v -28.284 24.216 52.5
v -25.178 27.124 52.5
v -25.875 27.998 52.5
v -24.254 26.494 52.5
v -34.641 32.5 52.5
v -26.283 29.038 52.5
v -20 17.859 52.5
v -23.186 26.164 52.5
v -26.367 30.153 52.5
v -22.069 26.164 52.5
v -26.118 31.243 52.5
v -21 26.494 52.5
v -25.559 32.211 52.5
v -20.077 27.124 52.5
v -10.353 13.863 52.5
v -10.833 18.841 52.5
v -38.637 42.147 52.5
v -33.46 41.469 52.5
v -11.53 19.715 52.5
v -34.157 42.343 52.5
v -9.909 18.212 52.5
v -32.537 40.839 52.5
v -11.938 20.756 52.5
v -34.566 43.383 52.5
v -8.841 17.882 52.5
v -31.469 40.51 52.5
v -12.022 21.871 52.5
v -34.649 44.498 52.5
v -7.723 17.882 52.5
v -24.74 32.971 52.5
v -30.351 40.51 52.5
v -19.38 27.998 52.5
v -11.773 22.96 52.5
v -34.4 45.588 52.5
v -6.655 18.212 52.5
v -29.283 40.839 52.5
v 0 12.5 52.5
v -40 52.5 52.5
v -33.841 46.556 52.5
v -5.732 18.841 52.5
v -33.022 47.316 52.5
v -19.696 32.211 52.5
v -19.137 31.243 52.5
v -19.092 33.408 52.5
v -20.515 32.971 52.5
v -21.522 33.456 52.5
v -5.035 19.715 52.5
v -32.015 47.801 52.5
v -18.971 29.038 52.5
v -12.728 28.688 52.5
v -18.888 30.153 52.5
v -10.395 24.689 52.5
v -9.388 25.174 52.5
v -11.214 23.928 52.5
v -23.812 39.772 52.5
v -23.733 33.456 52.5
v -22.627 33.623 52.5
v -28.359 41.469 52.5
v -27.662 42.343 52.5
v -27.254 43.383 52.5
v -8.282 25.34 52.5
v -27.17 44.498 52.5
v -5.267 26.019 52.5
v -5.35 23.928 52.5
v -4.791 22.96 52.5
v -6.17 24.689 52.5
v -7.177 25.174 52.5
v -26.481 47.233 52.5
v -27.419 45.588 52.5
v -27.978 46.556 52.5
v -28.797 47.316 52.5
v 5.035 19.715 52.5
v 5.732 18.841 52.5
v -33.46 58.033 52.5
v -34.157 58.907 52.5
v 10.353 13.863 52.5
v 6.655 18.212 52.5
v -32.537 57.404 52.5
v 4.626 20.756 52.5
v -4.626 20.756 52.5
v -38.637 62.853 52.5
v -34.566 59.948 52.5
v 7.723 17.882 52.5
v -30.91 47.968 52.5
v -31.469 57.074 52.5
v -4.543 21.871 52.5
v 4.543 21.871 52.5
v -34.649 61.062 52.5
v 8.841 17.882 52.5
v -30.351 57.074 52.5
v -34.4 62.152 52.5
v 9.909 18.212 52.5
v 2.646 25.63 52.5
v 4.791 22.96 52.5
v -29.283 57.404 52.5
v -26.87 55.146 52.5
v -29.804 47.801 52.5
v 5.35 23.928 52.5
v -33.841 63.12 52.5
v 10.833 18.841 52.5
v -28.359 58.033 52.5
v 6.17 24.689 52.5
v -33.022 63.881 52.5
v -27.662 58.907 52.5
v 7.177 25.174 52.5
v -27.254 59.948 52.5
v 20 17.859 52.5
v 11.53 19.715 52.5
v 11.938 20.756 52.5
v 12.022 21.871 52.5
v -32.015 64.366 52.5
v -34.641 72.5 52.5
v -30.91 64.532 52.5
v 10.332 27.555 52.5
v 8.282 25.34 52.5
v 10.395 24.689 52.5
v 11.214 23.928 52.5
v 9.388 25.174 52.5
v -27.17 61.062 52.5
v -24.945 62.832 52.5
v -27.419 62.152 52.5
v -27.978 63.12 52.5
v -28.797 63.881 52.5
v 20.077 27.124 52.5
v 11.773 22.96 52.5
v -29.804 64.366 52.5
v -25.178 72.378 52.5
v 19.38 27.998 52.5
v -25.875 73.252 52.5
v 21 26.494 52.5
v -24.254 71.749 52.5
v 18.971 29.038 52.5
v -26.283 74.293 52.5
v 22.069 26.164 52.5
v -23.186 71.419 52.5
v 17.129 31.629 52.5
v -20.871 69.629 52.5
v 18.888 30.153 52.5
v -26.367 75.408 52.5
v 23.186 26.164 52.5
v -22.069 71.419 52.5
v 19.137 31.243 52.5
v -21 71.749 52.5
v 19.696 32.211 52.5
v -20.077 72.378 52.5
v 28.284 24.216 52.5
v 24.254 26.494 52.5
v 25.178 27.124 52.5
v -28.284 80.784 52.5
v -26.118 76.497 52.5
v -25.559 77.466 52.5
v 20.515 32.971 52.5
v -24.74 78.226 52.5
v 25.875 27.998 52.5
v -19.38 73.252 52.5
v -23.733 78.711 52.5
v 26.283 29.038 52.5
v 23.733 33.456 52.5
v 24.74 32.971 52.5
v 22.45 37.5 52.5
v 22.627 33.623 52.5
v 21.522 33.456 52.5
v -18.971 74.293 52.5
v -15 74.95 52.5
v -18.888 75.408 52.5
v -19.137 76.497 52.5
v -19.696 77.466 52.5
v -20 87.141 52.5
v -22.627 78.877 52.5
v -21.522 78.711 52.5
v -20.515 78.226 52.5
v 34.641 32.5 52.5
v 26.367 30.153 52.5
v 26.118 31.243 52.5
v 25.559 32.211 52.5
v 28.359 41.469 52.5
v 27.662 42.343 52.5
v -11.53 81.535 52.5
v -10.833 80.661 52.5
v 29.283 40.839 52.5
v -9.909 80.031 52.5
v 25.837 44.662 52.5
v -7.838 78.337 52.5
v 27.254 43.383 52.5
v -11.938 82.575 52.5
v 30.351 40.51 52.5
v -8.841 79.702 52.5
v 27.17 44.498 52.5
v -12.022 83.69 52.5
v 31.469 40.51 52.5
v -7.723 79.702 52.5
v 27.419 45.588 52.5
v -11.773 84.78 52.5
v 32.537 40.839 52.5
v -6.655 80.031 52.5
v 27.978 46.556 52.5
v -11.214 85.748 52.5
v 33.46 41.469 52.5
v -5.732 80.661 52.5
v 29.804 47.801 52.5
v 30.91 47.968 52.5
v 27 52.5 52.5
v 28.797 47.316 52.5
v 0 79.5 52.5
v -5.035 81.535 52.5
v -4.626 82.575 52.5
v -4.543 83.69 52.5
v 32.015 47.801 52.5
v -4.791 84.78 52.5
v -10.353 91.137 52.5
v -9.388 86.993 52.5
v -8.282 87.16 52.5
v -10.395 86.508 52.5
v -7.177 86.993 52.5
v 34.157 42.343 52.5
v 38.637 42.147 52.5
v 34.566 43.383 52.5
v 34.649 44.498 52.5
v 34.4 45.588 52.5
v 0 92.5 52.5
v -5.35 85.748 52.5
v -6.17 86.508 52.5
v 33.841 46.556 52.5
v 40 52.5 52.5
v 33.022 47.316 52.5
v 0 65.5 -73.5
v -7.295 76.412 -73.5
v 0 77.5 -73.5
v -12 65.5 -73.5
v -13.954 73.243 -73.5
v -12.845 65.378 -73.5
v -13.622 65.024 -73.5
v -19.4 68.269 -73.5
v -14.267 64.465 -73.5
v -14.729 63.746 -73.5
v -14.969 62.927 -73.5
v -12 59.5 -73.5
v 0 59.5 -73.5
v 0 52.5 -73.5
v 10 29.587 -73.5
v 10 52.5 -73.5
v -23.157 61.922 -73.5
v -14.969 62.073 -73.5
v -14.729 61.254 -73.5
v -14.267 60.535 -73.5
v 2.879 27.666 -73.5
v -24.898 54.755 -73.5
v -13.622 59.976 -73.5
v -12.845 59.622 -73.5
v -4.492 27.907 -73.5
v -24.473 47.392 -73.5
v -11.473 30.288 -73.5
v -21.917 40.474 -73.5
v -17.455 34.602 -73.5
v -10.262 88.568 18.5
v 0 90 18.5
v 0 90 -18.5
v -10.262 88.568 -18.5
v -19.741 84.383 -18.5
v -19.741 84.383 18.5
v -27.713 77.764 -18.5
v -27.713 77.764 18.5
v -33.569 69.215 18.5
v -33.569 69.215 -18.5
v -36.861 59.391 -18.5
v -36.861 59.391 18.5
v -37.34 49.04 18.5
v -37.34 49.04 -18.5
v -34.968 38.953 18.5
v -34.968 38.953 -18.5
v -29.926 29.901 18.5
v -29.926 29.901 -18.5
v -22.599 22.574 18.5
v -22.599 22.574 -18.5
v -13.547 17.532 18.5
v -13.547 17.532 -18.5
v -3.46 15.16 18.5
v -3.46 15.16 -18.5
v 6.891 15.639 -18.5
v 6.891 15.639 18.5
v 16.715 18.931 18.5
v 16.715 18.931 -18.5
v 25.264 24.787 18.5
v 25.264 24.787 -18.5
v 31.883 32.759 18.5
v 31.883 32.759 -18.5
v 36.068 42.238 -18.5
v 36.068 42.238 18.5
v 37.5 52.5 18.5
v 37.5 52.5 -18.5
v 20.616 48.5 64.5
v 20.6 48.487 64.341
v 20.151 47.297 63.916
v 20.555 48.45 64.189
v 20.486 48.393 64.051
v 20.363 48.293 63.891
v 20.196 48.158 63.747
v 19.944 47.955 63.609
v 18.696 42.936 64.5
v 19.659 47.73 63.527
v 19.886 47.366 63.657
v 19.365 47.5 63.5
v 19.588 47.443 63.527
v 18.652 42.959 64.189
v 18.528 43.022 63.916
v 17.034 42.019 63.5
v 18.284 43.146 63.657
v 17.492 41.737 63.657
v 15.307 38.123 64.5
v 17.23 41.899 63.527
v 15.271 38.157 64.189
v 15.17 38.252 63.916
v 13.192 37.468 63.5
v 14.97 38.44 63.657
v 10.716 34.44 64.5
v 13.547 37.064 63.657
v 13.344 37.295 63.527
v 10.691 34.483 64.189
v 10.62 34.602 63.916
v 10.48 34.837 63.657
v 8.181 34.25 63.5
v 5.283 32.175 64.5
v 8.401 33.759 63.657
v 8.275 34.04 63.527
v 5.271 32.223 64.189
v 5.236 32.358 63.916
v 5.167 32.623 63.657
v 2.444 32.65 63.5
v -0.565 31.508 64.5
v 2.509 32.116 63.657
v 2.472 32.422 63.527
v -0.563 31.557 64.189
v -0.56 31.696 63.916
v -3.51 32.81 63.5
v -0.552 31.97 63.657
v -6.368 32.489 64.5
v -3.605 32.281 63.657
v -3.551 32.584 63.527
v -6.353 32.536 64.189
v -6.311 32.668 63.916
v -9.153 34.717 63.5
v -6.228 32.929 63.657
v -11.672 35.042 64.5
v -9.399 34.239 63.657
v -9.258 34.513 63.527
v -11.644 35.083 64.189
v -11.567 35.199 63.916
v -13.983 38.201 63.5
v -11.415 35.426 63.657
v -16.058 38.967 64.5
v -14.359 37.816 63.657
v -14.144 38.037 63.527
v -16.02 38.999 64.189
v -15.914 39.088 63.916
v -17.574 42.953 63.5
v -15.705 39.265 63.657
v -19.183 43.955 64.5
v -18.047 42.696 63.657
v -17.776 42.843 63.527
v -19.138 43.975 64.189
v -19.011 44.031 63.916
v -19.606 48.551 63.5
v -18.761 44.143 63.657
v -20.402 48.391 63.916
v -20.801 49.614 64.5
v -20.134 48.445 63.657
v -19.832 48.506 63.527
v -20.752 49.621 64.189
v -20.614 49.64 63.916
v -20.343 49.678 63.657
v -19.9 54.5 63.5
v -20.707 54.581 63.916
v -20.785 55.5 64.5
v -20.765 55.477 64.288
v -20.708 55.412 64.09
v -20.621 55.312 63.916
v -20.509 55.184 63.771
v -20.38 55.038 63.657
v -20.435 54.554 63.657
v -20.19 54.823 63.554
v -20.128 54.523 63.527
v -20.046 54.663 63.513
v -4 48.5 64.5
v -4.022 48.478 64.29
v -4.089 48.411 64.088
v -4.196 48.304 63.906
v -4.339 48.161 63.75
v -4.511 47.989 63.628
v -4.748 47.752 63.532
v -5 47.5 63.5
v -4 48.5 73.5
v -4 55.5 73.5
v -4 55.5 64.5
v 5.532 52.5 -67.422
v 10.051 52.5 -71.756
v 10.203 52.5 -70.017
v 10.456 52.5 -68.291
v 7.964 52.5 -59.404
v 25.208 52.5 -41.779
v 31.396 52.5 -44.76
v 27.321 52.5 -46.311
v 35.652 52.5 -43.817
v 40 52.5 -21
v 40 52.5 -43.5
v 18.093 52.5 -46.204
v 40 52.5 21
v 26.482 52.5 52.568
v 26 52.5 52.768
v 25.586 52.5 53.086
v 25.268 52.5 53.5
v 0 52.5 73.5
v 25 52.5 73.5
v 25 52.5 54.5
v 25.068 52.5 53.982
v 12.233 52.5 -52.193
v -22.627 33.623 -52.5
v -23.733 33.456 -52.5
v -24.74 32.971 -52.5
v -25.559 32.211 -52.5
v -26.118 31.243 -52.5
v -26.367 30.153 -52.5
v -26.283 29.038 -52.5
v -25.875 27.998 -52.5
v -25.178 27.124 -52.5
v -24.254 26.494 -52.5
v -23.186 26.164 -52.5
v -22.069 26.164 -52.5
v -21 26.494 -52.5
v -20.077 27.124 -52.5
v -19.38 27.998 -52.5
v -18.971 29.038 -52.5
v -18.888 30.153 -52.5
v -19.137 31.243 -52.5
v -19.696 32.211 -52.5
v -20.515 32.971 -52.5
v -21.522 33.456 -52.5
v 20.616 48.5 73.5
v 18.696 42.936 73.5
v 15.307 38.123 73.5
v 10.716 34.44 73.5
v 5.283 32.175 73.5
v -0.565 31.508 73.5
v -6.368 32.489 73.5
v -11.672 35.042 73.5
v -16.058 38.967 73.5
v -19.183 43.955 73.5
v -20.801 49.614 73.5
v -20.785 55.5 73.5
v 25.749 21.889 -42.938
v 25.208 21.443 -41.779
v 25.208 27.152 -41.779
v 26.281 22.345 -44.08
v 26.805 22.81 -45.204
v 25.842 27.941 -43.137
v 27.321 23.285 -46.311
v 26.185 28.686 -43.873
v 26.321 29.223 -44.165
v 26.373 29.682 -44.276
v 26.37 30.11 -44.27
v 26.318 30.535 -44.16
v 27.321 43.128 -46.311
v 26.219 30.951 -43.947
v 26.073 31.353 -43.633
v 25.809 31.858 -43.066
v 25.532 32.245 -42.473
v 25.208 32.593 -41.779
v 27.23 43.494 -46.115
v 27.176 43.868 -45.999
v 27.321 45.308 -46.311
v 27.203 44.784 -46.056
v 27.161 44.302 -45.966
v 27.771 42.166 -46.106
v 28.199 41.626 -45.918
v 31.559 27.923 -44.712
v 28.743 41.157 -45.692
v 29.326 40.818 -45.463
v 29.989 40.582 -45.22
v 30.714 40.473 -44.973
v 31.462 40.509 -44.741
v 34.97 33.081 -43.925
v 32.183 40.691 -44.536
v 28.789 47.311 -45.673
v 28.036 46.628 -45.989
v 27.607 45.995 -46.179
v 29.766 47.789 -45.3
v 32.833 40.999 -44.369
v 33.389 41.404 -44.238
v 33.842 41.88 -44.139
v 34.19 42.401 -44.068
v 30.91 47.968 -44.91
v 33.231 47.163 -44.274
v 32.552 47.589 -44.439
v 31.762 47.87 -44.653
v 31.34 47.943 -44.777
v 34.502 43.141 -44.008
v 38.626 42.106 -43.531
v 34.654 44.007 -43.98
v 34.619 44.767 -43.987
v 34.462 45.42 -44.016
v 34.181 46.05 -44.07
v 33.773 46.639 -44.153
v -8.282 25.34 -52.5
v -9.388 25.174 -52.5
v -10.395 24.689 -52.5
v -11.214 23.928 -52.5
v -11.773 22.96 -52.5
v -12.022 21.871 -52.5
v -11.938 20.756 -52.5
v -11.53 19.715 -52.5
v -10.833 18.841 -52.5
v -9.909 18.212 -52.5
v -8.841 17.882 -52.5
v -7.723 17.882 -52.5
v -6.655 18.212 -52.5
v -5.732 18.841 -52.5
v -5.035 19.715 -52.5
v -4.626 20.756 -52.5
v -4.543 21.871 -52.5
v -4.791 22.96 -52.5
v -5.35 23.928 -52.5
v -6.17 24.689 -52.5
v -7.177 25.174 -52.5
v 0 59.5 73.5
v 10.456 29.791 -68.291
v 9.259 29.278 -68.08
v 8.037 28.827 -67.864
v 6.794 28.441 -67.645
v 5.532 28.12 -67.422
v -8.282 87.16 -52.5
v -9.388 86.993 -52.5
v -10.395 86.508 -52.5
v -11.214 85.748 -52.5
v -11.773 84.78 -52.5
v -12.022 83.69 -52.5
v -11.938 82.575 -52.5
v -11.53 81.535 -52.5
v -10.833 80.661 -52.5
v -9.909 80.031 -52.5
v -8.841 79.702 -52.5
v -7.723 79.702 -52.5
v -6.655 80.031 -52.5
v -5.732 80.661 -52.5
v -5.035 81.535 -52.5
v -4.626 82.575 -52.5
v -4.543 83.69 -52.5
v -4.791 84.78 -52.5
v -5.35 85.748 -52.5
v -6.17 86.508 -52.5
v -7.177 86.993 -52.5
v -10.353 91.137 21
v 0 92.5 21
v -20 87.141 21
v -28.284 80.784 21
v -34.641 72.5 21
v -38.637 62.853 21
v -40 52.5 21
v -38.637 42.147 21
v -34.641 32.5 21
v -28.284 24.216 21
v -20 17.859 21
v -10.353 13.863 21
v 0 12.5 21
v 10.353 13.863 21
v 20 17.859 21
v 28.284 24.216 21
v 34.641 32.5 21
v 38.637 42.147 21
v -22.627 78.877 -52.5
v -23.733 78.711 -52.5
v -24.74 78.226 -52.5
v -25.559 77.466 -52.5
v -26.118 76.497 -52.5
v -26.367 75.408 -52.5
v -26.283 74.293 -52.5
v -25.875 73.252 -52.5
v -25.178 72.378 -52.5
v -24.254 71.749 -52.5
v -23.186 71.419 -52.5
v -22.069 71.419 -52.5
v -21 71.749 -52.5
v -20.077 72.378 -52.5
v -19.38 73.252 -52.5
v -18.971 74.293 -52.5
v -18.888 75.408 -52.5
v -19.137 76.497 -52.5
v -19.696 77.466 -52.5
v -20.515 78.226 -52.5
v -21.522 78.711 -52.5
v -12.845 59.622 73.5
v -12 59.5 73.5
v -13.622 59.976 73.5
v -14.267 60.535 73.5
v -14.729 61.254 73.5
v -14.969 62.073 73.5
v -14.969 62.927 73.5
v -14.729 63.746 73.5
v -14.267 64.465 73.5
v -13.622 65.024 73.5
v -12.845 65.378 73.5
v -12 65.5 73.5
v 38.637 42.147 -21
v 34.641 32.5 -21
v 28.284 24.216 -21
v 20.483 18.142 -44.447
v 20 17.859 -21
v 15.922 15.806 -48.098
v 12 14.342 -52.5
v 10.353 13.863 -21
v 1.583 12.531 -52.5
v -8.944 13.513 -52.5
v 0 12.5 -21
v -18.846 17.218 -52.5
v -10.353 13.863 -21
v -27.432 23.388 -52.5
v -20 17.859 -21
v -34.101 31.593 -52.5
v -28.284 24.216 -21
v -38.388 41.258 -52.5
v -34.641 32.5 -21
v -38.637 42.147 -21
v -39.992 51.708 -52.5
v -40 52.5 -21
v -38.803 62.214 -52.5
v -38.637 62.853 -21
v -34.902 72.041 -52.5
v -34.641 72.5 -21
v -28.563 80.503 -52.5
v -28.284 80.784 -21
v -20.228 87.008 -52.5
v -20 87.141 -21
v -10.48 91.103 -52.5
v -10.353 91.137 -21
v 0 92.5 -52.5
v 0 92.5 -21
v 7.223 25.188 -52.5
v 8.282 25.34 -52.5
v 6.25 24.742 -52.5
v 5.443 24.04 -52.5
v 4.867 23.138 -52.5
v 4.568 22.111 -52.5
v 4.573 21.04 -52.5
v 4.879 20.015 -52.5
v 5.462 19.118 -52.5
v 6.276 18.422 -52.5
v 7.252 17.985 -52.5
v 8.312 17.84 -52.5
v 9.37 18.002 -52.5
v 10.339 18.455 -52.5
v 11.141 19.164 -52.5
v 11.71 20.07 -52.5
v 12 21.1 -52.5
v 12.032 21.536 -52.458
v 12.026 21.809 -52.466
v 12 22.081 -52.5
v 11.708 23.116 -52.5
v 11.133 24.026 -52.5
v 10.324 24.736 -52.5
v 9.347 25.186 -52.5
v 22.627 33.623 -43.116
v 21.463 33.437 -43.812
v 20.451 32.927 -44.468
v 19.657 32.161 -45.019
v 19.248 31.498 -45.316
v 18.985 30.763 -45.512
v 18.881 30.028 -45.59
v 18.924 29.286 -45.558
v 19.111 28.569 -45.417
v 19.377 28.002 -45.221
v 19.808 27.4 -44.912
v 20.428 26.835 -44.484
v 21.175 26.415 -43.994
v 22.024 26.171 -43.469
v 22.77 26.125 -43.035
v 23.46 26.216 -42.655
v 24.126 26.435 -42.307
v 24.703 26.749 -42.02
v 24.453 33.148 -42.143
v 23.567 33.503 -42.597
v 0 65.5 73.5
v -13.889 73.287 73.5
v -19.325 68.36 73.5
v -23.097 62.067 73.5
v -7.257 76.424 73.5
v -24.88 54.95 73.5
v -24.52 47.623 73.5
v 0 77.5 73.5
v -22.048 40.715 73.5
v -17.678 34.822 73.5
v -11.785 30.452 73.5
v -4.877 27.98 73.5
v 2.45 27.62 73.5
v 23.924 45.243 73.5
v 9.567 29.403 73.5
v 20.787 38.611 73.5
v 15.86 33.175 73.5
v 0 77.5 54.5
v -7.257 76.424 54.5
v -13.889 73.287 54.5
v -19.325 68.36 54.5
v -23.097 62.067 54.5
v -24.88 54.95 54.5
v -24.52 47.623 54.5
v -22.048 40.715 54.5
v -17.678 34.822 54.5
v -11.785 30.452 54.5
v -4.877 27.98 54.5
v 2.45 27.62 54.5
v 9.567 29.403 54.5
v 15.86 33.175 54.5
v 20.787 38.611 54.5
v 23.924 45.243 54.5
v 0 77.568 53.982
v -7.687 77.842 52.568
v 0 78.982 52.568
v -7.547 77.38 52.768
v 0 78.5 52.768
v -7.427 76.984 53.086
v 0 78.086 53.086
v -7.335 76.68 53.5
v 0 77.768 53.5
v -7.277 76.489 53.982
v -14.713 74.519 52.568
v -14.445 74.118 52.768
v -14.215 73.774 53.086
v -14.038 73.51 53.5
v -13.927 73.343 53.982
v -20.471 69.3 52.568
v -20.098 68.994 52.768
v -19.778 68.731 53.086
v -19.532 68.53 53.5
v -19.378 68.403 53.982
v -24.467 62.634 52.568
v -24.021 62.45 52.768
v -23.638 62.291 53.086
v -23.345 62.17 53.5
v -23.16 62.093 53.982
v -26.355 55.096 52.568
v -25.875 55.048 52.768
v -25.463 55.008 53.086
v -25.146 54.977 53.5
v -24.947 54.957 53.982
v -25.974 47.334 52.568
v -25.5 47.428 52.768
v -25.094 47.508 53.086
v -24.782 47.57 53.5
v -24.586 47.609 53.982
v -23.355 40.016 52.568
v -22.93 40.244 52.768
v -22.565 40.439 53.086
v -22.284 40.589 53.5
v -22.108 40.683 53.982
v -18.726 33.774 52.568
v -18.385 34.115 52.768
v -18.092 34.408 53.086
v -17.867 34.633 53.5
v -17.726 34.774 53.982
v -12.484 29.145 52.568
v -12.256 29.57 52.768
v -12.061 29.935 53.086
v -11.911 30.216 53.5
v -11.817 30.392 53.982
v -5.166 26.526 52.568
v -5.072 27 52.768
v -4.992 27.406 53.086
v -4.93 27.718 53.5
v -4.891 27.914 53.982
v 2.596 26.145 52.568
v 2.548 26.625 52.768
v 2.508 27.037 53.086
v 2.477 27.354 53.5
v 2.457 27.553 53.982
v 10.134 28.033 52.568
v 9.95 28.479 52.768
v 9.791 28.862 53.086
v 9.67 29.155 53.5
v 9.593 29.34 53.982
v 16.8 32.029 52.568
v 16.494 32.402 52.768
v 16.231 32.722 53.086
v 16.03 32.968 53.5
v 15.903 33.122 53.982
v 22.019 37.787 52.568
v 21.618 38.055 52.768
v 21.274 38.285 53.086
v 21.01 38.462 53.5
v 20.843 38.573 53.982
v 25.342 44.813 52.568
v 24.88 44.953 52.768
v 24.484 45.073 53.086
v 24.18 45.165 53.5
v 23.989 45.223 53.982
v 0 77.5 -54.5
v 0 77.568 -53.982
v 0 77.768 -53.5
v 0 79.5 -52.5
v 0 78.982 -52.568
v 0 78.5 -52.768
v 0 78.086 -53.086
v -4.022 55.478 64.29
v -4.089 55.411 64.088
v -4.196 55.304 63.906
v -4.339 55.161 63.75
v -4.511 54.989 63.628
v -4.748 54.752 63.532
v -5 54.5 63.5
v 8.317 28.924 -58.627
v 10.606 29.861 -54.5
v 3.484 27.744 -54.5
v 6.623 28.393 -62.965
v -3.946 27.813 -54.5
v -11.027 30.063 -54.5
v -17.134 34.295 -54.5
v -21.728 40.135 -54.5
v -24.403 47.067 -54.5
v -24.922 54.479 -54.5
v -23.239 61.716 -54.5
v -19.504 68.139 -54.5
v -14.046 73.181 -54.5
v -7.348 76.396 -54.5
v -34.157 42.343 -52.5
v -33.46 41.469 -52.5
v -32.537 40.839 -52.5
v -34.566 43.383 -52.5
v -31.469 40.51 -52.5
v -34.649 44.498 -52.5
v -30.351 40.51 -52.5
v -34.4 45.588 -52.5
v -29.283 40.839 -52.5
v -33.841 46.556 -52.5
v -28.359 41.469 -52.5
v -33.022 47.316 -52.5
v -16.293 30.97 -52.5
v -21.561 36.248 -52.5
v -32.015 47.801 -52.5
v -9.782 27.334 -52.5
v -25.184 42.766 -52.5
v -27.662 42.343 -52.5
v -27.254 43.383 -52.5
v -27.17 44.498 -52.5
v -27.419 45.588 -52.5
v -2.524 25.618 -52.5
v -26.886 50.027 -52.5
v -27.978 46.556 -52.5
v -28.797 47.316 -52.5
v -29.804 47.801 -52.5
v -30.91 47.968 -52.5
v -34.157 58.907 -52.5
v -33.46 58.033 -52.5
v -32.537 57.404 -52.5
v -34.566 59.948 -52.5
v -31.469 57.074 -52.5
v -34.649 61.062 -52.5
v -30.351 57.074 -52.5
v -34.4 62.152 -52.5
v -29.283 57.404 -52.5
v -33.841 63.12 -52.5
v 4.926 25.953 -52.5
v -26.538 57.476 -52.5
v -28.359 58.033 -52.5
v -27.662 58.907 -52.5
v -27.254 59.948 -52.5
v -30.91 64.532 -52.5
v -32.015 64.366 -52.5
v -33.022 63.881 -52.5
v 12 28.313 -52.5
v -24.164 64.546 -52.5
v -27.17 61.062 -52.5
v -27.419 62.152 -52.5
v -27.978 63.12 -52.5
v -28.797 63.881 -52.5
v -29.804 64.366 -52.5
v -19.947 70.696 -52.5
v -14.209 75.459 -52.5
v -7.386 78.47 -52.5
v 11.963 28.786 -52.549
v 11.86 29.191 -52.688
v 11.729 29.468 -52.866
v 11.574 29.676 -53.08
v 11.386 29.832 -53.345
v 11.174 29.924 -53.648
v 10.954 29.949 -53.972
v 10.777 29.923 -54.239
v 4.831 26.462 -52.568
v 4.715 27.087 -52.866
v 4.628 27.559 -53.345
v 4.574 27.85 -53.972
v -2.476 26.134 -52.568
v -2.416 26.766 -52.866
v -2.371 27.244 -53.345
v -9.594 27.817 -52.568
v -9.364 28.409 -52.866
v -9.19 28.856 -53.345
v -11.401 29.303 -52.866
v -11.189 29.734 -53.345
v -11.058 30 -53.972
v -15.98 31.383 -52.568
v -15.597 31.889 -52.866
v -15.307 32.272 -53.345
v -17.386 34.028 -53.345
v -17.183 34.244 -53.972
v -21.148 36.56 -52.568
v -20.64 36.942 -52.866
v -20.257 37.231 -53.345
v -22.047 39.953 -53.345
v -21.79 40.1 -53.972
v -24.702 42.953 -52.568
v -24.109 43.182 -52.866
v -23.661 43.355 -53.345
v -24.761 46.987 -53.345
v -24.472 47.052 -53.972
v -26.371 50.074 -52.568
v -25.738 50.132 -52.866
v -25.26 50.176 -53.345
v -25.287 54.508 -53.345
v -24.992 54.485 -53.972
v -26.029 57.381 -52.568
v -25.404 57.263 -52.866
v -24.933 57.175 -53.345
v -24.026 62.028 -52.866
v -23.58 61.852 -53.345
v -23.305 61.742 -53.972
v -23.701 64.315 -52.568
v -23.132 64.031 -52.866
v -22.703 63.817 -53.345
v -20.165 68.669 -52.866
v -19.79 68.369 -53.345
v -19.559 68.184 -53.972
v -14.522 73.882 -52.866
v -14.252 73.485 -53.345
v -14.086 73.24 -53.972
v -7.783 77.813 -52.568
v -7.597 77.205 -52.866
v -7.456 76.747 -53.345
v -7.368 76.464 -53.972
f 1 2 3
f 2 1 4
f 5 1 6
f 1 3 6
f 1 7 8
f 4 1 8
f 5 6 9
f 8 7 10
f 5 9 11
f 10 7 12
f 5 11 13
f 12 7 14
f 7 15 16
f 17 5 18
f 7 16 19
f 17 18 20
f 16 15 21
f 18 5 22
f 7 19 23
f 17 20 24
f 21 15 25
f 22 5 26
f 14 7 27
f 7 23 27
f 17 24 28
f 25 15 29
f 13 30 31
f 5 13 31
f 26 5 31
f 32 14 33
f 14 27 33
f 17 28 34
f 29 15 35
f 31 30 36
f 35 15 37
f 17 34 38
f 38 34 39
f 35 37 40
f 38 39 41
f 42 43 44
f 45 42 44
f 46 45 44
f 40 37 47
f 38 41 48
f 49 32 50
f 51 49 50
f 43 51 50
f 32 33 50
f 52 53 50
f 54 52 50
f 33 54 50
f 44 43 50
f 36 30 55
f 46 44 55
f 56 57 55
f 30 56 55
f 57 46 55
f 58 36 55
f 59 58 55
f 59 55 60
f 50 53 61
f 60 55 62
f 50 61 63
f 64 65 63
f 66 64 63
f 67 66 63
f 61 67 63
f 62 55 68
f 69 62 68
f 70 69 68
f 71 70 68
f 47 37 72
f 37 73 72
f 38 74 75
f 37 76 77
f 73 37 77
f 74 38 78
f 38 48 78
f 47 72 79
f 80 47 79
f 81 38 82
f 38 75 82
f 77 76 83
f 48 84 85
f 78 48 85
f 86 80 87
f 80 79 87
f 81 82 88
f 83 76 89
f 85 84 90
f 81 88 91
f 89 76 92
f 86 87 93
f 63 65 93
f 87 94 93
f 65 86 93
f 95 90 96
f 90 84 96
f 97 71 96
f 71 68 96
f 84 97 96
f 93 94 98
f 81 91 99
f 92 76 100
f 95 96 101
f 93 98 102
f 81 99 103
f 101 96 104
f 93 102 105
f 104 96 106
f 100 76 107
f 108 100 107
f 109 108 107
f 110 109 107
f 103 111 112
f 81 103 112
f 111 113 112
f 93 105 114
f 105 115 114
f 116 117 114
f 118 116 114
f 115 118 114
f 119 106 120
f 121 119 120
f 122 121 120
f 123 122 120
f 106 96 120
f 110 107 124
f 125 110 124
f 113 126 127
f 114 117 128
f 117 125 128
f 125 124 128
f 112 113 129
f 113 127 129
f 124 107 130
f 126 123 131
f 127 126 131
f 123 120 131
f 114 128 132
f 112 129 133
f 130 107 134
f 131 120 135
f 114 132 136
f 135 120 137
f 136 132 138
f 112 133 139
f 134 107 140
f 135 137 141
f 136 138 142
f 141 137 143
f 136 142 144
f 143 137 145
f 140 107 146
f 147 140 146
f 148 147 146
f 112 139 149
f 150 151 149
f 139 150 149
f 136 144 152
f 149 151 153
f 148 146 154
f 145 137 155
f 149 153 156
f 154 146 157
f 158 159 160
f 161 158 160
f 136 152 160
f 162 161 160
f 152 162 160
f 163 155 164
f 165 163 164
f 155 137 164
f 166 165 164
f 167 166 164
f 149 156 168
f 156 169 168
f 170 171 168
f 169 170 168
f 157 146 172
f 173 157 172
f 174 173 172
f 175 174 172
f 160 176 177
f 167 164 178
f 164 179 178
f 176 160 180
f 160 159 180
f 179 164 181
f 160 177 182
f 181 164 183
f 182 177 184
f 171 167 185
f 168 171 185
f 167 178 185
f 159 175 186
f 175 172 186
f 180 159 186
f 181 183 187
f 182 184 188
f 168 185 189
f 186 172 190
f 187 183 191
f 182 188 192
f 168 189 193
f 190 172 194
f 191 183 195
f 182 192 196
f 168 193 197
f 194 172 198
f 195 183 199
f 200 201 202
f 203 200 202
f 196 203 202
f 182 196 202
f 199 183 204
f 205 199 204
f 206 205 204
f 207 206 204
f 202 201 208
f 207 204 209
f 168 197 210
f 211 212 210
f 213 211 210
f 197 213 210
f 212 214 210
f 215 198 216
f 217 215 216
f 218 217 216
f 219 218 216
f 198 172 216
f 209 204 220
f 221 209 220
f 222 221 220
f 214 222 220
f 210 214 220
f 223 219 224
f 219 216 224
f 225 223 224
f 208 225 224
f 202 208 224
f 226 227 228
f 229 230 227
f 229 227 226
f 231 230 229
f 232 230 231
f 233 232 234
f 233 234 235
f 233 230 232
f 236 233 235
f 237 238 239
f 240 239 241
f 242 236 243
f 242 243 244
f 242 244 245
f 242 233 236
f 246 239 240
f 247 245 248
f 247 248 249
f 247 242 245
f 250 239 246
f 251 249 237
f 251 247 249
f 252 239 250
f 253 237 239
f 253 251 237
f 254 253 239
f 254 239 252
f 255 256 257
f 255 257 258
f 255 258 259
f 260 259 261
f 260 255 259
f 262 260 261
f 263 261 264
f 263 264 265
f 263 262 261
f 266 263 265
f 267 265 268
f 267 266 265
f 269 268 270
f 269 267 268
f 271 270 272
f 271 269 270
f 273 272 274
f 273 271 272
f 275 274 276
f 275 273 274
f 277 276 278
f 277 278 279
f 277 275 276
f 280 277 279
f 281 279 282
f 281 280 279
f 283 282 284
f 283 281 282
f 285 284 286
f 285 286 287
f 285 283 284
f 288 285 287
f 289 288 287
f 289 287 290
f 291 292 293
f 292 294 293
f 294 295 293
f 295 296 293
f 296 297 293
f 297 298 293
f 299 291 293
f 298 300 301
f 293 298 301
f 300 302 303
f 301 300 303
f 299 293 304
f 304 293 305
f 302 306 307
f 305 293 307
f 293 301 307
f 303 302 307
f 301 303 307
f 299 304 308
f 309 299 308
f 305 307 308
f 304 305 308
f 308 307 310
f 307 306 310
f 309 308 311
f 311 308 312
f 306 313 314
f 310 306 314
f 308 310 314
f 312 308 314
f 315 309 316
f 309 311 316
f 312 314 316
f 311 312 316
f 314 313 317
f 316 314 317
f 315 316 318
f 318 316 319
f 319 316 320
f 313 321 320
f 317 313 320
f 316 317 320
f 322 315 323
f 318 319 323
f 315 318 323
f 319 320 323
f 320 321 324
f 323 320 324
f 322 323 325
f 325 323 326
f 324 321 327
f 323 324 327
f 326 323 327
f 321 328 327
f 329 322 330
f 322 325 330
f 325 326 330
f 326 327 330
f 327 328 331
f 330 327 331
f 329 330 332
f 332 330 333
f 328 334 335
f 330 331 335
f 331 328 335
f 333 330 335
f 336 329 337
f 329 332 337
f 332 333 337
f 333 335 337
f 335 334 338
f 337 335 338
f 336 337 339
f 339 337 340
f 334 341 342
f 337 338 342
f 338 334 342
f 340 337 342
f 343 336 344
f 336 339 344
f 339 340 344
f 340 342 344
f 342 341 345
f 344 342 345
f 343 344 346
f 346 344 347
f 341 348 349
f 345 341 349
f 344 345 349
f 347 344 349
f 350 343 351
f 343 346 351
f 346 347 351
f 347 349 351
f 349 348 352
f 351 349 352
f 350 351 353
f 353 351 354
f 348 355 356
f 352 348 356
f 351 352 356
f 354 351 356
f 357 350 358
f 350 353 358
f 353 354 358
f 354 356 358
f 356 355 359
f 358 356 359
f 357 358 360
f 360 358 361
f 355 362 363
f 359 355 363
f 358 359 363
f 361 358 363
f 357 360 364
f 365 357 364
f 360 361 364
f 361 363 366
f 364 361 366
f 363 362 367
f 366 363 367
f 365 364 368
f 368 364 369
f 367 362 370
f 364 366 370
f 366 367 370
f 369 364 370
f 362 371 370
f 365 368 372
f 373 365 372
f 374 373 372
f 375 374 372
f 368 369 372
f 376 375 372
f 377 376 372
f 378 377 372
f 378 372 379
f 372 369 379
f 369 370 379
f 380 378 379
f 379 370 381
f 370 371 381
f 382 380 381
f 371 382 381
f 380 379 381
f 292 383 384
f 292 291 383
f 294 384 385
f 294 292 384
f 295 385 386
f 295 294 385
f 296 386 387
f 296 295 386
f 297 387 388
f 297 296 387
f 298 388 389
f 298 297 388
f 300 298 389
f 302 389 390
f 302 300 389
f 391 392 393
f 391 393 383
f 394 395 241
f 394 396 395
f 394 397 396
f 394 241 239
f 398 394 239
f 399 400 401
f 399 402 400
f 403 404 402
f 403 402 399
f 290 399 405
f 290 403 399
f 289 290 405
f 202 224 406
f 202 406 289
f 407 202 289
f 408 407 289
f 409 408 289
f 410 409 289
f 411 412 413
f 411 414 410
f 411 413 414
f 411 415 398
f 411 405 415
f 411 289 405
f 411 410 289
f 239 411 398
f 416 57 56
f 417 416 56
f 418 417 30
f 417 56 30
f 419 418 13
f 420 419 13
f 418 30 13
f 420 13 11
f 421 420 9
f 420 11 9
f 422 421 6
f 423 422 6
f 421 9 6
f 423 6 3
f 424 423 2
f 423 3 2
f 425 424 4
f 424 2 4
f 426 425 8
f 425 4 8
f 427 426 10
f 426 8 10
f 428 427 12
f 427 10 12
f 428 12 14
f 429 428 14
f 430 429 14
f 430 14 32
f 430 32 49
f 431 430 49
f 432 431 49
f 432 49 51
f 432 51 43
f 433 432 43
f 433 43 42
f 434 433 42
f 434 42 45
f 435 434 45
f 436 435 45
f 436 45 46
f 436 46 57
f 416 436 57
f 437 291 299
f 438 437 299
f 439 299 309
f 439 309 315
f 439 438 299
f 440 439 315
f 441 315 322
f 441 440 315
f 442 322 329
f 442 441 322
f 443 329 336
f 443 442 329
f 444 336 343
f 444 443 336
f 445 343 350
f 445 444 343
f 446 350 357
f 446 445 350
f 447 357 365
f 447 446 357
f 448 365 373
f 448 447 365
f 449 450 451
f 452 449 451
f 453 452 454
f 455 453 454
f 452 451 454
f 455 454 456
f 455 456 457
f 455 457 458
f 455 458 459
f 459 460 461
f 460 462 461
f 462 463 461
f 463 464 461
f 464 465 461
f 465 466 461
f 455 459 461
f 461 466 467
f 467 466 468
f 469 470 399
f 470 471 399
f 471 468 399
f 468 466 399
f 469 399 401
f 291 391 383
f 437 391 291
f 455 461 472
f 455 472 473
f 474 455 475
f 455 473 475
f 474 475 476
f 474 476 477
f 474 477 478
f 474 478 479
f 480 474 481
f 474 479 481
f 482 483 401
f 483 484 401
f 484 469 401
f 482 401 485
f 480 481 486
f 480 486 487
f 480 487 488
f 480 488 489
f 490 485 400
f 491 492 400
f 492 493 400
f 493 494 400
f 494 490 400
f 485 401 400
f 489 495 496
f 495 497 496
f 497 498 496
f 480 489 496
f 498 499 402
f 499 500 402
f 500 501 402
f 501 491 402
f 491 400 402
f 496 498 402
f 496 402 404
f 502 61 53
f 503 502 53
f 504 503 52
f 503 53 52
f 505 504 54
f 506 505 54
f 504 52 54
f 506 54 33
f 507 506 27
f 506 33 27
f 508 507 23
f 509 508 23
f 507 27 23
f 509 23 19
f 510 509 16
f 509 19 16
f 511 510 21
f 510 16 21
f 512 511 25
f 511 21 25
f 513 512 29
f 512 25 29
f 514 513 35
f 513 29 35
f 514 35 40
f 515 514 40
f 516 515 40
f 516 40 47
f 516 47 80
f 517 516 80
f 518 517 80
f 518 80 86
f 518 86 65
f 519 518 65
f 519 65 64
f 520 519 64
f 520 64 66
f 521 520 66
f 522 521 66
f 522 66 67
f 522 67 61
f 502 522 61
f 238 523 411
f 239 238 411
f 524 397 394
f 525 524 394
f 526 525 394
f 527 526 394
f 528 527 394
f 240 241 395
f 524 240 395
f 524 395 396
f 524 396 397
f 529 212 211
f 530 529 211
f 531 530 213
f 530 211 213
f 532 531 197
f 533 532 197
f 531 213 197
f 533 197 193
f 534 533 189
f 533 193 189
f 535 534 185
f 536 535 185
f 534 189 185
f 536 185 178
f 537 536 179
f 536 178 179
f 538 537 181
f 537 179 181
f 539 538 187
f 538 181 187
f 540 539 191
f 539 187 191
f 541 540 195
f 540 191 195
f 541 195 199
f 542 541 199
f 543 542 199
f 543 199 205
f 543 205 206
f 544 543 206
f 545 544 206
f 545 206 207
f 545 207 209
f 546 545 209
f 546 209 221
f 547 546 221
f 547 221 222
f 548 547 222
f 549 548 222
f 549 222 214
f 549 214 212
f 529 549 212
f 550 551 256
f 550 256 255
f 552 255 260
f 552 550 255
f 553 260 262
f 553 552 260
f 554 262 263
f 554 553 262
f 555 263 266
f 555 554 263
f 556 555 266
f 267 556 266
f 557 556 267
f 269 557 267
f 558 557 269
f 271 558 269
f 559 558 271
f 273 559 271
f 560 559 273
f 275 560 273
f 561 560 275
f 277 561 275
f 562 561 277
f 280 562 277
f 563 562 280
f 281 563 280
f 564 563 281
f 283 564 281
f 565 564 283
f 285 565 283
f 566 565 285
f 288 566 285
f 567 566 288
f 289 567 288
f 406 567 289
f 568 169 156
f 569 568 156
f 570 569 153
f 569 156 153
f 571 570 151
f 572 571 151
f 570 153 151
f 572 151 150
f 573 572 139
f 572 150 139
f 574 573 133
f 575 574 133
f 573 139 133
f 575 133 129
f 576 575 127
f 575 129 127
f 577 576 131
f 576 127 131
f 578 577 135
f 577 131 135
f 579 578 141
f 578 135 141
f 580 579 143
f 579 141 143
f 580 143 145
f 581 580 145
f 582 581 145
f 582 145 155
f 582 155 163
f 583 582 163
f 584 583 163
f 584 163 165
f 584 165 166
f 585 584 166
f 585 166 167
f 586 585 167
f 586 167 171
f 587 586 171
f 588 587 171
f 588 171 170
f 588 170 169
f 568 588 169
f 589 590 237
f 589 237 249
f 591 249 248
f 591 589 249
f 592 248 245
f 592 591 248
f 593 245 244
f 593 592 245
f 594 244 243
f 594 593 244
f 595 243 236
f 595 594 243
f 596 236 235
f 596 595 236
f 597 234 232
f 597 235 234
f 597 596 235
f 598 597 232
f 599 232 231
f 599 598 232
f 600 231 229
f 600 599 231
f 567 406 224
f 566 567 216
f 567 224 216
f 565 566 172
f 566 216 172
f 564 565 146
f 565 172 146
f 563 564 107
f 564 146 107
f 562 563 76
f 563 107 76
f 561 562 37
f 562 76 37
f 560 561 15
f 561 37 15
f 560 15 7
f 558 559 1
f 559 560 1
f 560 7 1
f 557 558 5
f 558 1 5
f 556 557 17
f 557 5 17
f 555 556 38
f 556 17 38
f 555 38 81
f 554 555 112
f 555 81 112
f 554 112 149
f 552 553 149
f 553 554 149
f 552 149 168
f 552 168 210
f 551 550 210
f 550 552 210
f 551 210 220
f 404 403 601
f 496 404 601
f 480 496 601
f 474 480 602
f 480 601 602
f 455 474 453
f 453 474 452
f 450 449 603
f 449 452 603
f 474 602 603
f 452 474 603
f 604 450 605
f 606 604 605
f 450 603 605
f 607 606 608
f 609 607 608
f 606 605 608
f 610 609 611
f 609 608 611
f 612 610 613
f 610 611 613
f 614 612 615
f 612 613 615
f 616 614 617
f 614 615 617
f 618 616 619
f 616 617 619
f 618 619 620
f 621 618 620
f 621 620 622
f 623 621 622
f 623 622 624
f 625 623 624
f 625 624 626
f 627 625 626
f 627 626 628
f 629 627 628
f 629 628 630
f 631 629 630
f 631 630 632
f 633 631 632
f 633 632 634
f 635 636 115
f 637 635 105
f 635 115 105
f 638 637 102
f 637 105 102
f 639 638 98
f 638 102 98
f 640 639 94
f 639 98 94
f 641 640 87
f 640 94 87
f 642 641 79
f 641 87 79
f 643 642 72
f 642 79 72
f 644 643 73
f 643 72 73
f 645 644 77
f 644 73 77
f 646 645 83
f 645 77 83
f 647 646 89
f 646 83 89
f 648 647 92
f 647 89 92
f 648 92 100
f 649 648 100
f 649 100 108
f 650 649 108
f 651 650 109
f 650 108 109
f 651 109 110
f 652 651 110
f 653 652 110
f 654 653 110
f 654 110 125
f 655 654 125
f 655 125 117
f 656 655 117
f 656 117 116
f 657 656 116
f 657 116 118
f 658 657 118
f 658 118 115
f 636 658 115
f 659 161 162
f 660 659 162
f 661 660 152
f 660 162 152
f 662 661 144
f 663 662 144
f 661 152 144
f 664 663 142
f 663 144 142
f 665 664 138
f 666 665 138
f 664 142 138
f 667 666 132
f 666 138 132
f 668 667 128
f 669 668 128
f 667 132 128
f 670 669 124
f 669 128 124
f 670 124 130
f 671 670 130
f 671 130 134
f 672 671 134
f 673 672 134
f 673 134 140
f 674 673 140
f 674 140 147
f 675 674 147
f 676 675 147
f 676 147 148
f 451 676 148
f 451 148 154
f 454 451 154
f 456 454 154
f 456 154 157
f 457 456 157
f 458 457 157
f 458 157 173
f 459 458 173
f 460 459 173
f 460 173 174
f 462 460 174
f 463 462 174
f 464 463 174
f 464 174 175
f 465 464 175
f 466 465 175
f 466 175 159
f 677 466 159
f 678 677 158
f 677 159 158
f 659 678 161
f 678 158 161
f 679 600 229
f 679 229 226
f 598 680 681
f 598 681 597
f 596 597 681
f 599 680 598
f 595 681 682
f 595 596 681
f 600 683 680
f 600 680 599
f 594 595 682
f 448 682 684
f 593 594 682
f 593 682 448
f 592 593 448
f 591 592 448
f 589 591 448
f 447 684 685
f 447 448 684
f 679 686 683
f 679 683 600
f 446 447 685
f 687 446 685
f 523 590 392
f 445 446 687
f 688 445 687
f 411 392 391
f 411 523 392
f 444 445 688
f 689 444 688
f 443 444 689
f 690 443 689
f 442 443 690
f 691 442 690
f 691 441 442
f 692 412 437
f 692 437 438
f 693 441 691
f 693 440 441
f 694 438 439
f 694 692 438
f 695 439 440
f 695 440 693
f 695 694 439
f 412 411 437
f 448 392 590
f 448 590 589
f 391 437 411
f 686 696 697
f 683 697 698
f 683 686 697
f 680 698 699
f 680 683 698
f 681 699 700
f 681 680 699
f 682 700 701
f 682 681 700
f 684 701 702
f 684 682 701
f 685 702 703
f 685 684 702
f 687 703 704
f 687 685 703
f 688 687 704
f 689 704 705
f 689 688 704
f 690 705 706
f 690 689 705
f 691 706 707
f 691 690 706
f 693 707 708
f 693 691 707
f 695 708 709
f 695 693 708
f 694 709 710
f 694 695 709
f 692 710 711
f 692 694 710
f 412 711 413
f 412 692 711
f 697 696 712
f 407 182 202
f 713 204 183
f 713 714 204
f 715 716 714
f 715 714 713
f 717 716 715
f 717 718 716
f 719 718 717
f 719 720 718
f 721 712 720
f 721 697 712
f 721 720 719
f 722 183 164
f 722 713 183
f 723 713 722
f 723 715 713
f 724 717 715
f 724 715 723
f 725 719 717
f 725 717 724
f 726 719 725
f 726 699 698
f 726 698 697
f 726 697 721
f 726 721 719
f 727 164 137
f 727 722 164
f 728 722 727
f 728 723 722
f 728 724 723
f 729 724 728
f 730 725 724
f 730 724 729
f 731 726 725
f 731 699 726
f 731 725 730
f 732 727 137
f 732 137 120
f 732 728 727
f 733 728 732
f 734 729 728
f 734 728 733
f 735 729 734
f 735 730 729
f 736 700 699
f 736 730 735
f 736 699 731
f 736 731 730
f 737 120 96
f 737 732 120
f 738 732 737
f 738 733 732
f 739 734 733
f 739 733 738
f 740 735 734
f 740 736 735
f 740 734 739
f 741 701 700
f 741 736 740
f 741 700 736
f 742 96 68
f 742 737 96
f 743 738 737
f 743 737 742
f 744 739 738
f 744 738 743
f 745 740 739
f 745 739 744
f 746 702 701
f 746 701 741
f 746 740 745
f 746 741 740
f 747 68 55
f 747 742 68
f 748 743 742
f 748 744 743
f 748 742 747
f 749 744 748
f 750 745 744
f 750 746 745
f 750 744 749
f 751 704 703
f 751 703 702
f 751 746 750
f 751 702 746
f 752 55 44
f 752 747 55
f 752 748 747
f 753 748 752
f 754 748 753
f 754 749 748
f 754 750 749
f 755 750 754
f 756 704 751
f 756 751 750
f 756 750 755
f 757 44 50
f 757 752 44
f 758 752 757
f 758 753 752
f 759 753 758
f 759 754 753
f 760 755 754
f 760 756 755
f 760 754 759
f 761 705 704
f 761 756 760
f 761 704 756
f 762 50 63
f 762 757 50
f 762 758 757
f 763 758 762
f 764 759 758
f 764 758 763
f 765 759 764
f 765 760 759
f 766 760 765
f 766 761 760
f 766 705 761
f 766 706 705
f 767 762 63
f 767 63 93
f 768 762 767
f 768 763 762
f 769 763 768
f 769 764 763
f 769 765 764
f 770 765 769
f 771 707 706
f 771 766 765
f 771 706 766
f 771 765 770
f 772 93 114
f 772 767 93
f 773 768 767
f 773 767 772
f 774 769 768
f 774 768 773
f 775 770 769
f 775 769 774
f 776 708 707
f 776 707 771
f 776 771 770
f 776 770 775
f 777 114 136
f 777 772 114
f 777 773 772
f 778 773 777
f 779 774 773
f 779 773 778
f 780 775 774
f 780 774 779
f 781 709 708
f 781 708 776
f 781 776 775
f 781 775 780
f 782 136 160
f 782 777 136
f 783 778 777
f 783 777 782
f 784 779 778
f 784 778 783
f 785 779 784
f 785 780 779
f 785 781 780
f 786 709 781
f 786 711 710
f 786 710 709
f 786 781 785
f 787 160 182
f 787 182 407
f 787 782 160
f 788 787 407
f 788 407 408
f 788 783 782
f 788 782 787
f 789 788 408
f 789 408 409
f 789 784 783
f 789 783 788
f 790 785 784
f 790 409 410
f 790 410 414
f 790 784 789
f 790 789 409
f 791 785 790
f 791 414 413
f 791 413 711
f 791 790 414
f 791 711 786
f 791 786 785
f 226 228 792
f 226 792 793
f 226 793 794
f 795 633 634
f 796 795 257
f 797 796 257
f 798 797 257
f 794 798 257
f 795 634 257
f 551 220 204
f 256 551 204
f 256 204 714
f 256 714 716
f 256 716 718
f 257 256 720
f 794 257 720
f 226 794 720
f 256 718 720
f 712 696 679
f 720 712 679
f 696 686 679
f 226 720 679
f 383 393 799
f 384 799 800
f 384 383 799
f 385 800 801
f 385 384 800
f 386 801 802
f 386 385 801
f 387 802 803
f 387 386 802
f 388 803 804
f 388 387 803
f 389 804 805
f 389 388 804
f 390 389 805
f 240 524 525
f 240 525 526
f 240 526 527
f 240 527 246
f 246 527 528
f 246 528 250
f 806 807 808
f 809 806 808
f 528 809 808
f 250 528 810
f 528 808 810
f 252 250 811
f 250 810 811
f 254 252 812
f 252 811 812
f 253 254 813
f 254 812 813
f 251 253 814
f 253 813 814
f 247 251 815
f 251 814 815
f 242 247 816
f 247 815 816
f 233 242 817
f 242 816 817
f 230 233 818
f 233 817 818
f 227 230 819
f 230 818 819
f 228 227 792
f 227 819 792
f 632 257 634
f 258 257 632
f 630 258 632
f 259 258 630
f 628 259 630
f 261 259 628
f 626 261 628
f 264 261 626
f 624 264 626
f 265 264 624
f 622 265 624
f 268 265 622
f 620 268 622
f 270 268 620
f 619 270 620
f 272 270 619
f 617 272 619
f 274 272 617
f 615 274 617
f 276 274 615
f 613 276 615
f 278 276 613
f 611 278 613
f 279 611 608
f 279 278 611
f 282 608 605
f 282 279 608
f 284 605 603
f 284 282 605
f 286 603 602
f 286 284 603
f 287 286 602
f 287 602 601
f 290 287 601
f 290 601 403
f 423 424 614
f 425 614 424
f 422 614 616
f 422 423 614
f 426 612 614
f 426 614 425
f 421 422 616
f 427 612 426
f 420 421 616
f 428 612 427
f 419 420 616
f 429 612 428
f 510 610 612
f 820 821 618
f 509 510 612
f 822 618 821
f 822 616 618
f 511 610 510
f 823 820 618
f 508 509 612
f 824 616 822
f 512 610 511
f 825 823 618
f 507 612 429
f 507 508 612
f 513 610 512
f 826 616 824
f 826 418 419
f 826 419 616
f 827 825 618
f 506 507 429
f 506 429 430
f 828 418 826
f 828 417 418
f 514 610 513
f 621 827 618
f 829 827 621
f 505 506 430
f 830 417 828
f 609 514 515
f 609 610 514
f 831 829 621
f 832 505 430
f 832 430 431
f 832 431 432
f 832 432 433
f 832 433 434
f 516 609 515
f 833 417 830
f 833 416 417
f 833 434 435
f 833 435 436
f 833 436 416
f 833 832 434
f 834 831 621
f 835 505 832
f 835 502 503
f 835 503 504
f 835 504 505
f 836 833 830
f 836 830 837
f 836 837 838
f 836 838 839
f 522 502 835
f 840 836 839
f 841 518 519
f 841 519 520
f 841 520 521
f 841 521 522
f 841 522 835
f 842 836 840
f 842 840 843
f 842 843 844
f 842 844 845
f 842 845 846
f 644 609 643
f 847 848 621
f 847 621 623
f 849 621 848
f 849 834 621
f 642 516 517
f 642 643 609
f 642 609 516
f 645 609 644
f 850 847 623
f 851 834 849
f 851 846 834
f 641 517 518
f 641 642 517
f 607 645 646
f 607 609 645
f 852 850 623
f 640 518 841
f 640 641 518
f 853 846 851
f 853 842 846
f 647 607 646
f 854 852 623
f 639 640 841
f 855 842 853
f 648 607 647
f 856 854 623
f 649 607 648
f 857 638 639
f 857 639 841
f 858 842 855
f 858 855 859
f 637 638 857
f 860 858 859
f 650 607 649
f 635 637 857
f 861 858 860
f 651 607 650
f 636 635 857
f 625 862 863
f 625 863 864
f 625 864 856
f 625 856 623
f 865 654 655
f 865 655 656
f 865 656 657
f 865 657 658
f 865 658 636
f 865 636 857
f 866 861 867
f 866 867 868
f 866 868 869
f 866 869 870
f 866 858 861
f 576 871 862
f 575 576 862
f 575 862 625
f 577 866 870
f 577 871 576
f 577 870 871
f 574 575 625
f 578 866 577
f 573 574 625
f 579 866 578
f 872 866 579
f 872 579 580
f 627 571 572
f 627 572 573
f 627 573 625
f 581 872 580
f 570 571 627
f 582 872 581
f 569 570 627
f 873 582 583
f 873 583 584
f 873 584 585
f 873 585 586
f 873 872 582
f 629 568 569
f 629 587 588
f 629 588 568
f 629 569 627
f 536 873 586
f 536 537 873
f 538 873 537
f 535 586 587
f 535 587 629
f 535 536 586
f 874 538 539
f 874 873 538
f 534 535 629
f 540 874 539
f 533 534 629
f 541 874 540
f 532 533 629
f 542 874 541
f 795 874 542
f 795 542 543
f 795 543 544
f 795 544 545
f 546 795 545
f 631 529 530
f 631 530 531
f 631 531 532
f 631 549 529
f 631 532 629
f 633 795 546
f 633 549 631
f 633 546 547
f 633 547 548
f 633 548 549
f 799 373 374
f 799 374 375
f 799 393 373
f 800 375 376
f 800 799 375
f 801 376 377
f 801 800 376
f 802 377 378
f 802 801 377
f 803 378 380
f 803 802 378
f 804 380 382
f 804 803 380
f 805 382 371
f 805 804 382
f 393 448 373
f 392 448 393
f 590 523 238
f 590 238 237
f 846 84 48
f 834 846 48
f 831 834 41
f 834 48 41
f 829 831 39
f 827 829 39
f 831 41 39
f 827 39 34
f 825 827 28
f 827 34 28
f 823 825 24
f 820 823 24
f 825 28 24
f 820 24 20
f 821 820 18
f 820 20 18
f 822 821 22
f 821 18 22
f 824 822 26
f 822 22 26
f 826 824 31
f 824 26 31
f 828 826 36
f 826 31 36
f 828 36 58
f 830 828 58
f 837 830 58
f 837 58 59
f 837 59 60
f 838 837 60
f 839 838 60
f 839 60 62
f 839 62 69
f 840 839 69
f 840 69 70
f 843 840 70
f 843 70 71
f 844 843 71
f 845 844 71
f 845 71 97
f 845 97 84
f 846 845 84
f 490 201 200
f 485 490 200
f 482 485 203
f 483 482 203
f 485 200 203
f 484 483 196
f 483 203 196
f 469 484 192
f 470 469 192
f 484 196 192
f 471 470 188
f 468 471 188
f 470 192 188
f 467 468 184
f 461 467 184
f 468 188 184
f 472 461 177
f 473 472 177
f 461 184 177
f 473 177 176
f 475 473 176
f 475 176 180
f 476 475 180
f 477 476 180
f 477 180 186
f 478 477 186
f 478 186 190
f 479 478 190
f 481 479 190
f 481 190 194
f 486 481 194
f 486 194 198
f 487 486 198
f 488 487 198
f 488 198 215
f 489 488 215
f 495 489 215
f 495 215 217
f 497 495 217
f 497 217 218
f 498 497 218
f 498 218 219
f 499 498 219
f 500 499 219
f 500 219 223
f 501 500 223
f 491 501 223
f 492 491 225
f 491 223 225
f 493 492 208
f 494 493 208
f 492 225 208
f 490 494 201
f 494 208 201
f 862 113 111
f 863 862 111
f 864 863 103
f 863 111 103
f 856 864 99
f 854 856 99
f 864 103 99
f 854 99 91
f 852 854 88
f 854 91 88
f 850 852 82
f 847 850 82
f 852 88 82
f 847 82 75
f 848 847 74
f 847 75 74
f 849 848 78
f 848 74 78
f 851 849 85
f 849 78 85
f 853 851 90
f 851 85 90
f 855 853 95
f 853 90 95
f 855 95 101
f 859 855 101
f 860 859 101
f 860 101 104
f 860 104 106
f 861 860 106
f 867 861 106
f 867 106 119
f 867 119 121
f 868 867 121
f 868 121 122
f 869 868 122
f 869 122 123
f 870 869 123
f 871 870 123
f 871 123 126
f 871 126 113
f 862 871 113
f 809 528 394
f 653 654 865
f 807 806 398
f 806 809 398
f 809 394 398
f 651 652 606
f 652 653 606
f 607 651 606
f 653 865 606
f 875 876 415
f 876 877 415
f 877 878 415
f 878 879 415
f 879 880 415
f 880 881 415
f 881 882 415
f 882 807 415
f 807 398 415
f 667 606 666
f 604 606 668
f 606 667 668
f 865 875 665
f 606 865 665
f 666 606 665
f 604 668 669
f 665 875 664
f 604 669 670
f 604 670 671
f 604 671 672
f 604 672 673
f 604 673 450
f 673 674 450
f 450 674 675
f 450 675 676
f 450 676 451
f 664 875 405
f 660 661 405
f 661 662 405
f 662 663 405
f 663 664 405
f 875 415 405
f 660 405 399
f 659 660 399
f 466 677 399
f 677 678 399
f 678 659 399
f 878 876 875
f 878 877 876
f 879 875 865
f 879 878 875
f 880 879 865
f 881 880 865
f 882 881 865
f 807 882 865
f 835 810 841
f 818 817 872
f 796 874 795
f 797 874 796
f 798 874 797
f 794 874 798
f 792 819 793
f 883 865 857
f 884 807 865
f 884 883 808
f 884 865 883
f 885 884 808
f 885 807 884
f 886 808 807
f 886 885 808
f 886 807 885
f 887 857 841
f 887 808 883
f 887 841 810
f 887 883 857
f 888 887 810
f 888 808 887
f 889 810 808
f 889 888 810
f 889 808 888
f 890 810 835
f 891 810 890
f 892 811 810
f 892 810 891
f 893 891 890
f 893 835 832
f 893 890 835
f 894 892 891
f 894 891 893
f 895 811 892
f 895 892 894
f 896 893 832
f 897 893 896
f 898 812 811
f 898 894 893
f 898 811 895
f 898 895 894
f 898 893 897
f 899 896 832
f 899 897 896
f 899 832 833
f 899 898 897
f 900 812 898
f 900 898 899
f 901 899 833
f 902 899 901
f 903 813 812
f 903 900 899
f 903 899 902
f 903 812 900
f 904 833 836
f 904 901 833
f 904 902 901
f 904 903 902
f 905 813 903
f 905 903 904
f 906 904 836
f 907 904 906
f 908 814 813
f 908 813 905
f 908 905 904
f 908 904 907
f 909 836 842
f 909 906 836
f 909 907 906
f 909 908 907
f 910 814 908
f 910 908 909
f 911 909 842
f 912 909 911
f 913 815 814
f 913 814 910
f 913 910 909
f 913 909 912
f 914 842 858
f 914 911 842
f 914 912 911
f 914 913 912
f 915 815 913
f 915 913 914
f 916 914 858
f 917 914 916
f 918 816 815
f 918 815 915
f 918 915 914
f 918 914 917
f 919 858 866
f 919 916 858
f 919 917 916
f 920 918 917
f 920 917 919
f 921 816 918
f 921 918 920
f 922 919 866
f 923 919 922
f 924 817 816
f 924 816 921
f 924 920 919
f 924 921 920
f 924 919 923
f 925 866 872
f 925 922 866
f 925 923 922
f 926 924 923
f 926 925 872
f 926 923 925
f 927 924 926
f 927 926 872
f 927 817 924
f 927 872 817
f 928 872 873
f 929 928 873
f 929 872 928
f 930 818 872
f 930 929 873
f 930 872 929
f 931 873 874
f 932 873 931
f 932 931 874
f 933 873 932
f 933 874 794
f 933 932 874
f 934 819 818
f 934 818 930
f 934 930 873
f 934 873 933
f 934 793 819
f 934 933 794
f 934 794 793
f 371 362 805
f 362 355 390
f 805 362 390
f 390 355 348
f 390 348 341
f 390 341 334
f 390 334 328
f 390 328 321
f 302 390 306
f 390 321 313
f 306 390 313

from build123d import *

# Parameters (mm, degrees)
SKETCH1_R             = 40
BOSS_EXTRUDE1_DEPTH   = 105
SKETCH2_R             = 25
BOSS_EXTRUDE2_DEPTH   = 21
BOSS_EXTRUDE3_START   = 21
SKETCH3_R             = 25
BOSS_EXTRUDE3_DEPTH   = 21
FILLET1_R             = 2
SKETCH5_W             = 45.050033199
SKETCH5_H             = 42.615736352
CUT_EXTRUDE1_DEPTH    = 158.508729917
CUT_EXTRUDE2_DEPTH    = 158.508729917
SKETCH8_R             = 3.75
CUT_EXTRUDE3_DEPTH    = 158.508729917
CUT_EXTRUDE4_DEPTH    = 139.115893365
CUT_EXTRUDE5_DEPTH    = 10
FILLET2_R             = 1
BODY_MOVE_COPY1_ANGLE = 90


with BuildPart() as part:
    # Sketch1 → Boss-Extrude1 (new body)
    with BuildSketch(Plane(origin=(0, 0, 0), x_dir=(1, 0, 0), z_dir=(0, 1, 0))):
        with Locations(Location((0, 0, 0), (0, 0, 270))):
            Circle(SKETCH1_R)
    extrude(amount=BOSS_EXTRUDE1_DEPTH)

    # Sketch2 → Boss-Extrude2 (add)
    with BuildSketch(Plane(origin=(0, 105, 0), x_dir=(1, 0, 0), z_dir=(0, 1, 0))):
        with Locations(Location((0, 0, 0), (0, 0, 90))):
            Circle(SKETCH2_R)
    extrude(amount=BOSS_EXTRUDE2_DEPTH)

    # Sketch3 → Boss-Extrude3 (add)
    with BuildSketch(Plane(origin=(0, 0, 0), x_dir=(-1, 0, 0), z_dir=(0, -1, 0)).offset(BOSS_EXTRUDE3_START)):
        with Locations(Location((0, 0, 0), (0, 0, 90))):
            Circle(SKETCH3_R)
    extrude(amount=-BOSS_EXTRUDE3_DEPTH)

    # Fillet1
    fillet1_edges = [part.edges().sort_by_distance(p)[0] for p in [
        (0, 0, 25),
        (0, 105, 25),
    ]]
    fillet(fillet1_edges, radius=FILLET1_R)

    # Sketch4 → Cut-Revolve1 (revolve, cut)
    with BuildSketch(Plane(origin=(0, 0, 0), x_dir=(0, 0, -1), z_dir=(1, 0, 0)), mode=Mode.PRIVATE) as cut_revolve1_sk:
        Polygon((40, 73.5), (37.5, 71), (37.5, 34), (40, 31.5), align=None)
    revolve(cut_revolve1_sk.sketch.rotate(Axis((0, 105, 0), (0, -1, 0)), 180), axis=Axis((0, 105, 0), (0, -1, 0)), mode=Mode.SUBTRACT)

    # Sketch5 → Cut-Extrude1 (cut, through all)
    with BuildSketch(Plane(origin=(0, -21, 0), x_dir=(-1, 0, 0), z_dir=(0, -1, 0))):
        with Locations((-22.5250166, -21.307868176)):
            Rectangle(SKETCH5_W, SKETCH5_H)
    extrude(amount=-CUT_EXTRUDE1_DEPTH, mode=Mode.SUBTRACT)

    # Sketch7 → Cut-Extrude2 (cut, through all)
    with BuildSketch(Plane(origin=(0, -21, 0), x_dir=(-1, 0, 0), z_dir=(0, -1, 0))):
        with BuildLine():
            Line((12, -13), (-12, -13))
            ThreePointArc((-12, -13), (-15, -10), (-12, -7))
            Line((-12, -7), (12, -7))
            ThreePointArc((12, -7), (15, -10), (12, -13))
        make_face()
    extrude(amount=-CUT_EXTRUDE2_DEPTH, mode=Mode.SUBTRACT)

    # Sketch8 → Cut-Extrude3 (cut, through all)
    with BuildSketch(Plane(origin=(0, -21, 0), x_dir=(-1, 0, 0), z_dir=(0, -1, 0))):
        with Locations(Location((8.282209443, -30.909626441, 0), (0, 0, 270))):
            Circle(SKETCH8_R)
        with Locations((-8.282209443, -30.909626441)):
            Circle(SKETCH8_R)
        with Locations((-22.627416998, -22.627416998)):
            Circle(SKETCH8_R)
        with Locations((-30.909626441, -8.282209443)):
            Circle(SKETCH8_R)
        with Locations(Location((-30.909626441, 8.282209443, 0), (0, 0, 270))):
            Circle(SKETCH8_R)
        with Locations(Location((-22.627416998, 22.627416998, 0), (0, 0, 270))):
            Circle(SKETCH8_R)
        with Locations(Location((-8.282209443, 30.909626441, 0), (0, 0, 270))):
            Circle(SKETCH8_R)
        with Locations(Location((8.282209443, 30.909626441, 0), (0, 0, 270))):
            Circle(SKETCH8_R)
        with Locations(Location((22.627416998, 22.627416998, 0), (0, 0, 270))):
            Circle(SKETCH8_R)
        with Locations(Location((30.909626441, 8.282209443, 0), (0, 0, 270))):
            Circle(SKETCH8_R)
        with Locations(Location((30.909626441, -8.282209443, 0), (0, 0, 270))):
            Circle(SKETCH8_R)
        with Locations(Location((22.627416998, -22.627416998, 0), (0, 0, 270))):
            Circle(SKETCH8_R)
    extrude(amount=-CUT_EXTRUDE3_DEPTH, mode=Mode.SUBTRACT)

    # Sketch9 → Cut-Extrude4 (cut, through all)
    with BuildSketch(Plane.XY):
        with BuildLine():
            Line((25, 123.355095289), (40, 126))
            Line((40, 126), (30.207539179, 105))
            Line((30.207539179, 105), (40, 105))
            Line((40, 105), (40, 96))
            ThreePointArc((40, 96), (61.213203436, 104.786796564), (70, 126))
            ThreePointArc((70, 126), (40, 156), (10, 126))
            Line((10, 126), (25, 126))
            Line((25, 126), (25, 123.355095289))
        make_face()
        with BuildLine():
            Line((30.207539179, 105), (40, 126))
            Line((40, 126), (25, 123.355095289))
            Line((25, 123.355095289), (25, 107))
            ThreePointArc((25, 107), (25.585786438, 105.585786438), (27, 105))
            Line((27, 105), (30.207539179, 105))
        make_face()
        with BuildLine():
            ThreePointArc((27.321452148, 98.810766389), (16.199399791, 107.73715713), (10.45576741, 120.79055467))
            Line((10.45576741, 120.79055467), (5.531728645, 119.922313782))
            ThreePointArc((5.531728645, 119.922313782), (12.23263309, 104.693349985), (25.208360839, 94.279227454))
            Line((25.208360839, 94.279227454), (27.321452148, 98.810766389))
        make_face()
        with BuildLine():
            Line((25, 107), (25, 123.355095289))
            Line((25, 123.355095289), (10.45576741, 120.79055467))
            ThreePointArc((10.45576741, 120.79055467), (16.199399791, 107.73715713), (27.321452148, 98.810766389))
            Line((27.321452148, 98.810766389), (30.207539179, 105))
            Line((30.207539179, 105), (27, 105))
            ThreePointArc((27, 105), (25.585786438, 105.585786438), (25, 107))
        make_face()
        with BuildLine():
            Line((10.45576741, 120.79055467), (25, 123.355095289))
            Line((25, 123.355095289), (25, 126))
            Line((25, 126), (10, 126))
            ThreePointArc((10, 126), (10.114159057, 123.385327718), (10.45576741, 120.79055467))
        make_face()
        with BuildLine():
            Line((40, 105), (30.207539179, 105))
            Line((30.207539179, 105), (27.321452148, 98.810766389))
            ThreePointArc((27.321452148, 98.810766389), (33.506811582, 96.711119786), (40, 96))
            Line((40, 96), (40, 105))
        make_face()
    extrude(amount=-CUT_EXTRUDE4_DEPTH, mode=Mode.SUBTRACT)

    # Sketch10 → Cut-Extrude5 (cut)
    with BuildSketch(Plane(origin=(0, -21, 0), x_dir=(-1, 0, 0), z_dir=(0, -1, 0))):
        with BuildLine():
            Line((4, -3), (4, 4))
            Line((4, 4), (-20.615528128, 4))
            ThreePointArc((-20.615528128, 4), (3.501020872, 20.706106656), (20.784609691, -3))
            Line((20.784609691, -3), (4, -3))
        make_face()
    extrude(amount=-CUT_EXTRUDE5_DEPTH, mode=Mode.SUBTRACT)

    # Fillet2
    fillet2_edges = [part.edges().sort_by_distance(p)[0] for p in [
        (-12.392304845, -11, 3),
        (-4, -11, -0.5),
        (8.307764064, -11, -4),
        (-3.501020872, -11, -20.706106656),
    ]]
    fillet(fillet2_edges, radius=FILLET2_R)


with BuildPart() as part_1:
    # Body-Move/Copy1: moved
    add(part.part.rotate(Axis((0, 52.5, 0), (-1, 0, 0)), BODY_MOVE_COPY1_ANGLE))


solid = part_1.part
